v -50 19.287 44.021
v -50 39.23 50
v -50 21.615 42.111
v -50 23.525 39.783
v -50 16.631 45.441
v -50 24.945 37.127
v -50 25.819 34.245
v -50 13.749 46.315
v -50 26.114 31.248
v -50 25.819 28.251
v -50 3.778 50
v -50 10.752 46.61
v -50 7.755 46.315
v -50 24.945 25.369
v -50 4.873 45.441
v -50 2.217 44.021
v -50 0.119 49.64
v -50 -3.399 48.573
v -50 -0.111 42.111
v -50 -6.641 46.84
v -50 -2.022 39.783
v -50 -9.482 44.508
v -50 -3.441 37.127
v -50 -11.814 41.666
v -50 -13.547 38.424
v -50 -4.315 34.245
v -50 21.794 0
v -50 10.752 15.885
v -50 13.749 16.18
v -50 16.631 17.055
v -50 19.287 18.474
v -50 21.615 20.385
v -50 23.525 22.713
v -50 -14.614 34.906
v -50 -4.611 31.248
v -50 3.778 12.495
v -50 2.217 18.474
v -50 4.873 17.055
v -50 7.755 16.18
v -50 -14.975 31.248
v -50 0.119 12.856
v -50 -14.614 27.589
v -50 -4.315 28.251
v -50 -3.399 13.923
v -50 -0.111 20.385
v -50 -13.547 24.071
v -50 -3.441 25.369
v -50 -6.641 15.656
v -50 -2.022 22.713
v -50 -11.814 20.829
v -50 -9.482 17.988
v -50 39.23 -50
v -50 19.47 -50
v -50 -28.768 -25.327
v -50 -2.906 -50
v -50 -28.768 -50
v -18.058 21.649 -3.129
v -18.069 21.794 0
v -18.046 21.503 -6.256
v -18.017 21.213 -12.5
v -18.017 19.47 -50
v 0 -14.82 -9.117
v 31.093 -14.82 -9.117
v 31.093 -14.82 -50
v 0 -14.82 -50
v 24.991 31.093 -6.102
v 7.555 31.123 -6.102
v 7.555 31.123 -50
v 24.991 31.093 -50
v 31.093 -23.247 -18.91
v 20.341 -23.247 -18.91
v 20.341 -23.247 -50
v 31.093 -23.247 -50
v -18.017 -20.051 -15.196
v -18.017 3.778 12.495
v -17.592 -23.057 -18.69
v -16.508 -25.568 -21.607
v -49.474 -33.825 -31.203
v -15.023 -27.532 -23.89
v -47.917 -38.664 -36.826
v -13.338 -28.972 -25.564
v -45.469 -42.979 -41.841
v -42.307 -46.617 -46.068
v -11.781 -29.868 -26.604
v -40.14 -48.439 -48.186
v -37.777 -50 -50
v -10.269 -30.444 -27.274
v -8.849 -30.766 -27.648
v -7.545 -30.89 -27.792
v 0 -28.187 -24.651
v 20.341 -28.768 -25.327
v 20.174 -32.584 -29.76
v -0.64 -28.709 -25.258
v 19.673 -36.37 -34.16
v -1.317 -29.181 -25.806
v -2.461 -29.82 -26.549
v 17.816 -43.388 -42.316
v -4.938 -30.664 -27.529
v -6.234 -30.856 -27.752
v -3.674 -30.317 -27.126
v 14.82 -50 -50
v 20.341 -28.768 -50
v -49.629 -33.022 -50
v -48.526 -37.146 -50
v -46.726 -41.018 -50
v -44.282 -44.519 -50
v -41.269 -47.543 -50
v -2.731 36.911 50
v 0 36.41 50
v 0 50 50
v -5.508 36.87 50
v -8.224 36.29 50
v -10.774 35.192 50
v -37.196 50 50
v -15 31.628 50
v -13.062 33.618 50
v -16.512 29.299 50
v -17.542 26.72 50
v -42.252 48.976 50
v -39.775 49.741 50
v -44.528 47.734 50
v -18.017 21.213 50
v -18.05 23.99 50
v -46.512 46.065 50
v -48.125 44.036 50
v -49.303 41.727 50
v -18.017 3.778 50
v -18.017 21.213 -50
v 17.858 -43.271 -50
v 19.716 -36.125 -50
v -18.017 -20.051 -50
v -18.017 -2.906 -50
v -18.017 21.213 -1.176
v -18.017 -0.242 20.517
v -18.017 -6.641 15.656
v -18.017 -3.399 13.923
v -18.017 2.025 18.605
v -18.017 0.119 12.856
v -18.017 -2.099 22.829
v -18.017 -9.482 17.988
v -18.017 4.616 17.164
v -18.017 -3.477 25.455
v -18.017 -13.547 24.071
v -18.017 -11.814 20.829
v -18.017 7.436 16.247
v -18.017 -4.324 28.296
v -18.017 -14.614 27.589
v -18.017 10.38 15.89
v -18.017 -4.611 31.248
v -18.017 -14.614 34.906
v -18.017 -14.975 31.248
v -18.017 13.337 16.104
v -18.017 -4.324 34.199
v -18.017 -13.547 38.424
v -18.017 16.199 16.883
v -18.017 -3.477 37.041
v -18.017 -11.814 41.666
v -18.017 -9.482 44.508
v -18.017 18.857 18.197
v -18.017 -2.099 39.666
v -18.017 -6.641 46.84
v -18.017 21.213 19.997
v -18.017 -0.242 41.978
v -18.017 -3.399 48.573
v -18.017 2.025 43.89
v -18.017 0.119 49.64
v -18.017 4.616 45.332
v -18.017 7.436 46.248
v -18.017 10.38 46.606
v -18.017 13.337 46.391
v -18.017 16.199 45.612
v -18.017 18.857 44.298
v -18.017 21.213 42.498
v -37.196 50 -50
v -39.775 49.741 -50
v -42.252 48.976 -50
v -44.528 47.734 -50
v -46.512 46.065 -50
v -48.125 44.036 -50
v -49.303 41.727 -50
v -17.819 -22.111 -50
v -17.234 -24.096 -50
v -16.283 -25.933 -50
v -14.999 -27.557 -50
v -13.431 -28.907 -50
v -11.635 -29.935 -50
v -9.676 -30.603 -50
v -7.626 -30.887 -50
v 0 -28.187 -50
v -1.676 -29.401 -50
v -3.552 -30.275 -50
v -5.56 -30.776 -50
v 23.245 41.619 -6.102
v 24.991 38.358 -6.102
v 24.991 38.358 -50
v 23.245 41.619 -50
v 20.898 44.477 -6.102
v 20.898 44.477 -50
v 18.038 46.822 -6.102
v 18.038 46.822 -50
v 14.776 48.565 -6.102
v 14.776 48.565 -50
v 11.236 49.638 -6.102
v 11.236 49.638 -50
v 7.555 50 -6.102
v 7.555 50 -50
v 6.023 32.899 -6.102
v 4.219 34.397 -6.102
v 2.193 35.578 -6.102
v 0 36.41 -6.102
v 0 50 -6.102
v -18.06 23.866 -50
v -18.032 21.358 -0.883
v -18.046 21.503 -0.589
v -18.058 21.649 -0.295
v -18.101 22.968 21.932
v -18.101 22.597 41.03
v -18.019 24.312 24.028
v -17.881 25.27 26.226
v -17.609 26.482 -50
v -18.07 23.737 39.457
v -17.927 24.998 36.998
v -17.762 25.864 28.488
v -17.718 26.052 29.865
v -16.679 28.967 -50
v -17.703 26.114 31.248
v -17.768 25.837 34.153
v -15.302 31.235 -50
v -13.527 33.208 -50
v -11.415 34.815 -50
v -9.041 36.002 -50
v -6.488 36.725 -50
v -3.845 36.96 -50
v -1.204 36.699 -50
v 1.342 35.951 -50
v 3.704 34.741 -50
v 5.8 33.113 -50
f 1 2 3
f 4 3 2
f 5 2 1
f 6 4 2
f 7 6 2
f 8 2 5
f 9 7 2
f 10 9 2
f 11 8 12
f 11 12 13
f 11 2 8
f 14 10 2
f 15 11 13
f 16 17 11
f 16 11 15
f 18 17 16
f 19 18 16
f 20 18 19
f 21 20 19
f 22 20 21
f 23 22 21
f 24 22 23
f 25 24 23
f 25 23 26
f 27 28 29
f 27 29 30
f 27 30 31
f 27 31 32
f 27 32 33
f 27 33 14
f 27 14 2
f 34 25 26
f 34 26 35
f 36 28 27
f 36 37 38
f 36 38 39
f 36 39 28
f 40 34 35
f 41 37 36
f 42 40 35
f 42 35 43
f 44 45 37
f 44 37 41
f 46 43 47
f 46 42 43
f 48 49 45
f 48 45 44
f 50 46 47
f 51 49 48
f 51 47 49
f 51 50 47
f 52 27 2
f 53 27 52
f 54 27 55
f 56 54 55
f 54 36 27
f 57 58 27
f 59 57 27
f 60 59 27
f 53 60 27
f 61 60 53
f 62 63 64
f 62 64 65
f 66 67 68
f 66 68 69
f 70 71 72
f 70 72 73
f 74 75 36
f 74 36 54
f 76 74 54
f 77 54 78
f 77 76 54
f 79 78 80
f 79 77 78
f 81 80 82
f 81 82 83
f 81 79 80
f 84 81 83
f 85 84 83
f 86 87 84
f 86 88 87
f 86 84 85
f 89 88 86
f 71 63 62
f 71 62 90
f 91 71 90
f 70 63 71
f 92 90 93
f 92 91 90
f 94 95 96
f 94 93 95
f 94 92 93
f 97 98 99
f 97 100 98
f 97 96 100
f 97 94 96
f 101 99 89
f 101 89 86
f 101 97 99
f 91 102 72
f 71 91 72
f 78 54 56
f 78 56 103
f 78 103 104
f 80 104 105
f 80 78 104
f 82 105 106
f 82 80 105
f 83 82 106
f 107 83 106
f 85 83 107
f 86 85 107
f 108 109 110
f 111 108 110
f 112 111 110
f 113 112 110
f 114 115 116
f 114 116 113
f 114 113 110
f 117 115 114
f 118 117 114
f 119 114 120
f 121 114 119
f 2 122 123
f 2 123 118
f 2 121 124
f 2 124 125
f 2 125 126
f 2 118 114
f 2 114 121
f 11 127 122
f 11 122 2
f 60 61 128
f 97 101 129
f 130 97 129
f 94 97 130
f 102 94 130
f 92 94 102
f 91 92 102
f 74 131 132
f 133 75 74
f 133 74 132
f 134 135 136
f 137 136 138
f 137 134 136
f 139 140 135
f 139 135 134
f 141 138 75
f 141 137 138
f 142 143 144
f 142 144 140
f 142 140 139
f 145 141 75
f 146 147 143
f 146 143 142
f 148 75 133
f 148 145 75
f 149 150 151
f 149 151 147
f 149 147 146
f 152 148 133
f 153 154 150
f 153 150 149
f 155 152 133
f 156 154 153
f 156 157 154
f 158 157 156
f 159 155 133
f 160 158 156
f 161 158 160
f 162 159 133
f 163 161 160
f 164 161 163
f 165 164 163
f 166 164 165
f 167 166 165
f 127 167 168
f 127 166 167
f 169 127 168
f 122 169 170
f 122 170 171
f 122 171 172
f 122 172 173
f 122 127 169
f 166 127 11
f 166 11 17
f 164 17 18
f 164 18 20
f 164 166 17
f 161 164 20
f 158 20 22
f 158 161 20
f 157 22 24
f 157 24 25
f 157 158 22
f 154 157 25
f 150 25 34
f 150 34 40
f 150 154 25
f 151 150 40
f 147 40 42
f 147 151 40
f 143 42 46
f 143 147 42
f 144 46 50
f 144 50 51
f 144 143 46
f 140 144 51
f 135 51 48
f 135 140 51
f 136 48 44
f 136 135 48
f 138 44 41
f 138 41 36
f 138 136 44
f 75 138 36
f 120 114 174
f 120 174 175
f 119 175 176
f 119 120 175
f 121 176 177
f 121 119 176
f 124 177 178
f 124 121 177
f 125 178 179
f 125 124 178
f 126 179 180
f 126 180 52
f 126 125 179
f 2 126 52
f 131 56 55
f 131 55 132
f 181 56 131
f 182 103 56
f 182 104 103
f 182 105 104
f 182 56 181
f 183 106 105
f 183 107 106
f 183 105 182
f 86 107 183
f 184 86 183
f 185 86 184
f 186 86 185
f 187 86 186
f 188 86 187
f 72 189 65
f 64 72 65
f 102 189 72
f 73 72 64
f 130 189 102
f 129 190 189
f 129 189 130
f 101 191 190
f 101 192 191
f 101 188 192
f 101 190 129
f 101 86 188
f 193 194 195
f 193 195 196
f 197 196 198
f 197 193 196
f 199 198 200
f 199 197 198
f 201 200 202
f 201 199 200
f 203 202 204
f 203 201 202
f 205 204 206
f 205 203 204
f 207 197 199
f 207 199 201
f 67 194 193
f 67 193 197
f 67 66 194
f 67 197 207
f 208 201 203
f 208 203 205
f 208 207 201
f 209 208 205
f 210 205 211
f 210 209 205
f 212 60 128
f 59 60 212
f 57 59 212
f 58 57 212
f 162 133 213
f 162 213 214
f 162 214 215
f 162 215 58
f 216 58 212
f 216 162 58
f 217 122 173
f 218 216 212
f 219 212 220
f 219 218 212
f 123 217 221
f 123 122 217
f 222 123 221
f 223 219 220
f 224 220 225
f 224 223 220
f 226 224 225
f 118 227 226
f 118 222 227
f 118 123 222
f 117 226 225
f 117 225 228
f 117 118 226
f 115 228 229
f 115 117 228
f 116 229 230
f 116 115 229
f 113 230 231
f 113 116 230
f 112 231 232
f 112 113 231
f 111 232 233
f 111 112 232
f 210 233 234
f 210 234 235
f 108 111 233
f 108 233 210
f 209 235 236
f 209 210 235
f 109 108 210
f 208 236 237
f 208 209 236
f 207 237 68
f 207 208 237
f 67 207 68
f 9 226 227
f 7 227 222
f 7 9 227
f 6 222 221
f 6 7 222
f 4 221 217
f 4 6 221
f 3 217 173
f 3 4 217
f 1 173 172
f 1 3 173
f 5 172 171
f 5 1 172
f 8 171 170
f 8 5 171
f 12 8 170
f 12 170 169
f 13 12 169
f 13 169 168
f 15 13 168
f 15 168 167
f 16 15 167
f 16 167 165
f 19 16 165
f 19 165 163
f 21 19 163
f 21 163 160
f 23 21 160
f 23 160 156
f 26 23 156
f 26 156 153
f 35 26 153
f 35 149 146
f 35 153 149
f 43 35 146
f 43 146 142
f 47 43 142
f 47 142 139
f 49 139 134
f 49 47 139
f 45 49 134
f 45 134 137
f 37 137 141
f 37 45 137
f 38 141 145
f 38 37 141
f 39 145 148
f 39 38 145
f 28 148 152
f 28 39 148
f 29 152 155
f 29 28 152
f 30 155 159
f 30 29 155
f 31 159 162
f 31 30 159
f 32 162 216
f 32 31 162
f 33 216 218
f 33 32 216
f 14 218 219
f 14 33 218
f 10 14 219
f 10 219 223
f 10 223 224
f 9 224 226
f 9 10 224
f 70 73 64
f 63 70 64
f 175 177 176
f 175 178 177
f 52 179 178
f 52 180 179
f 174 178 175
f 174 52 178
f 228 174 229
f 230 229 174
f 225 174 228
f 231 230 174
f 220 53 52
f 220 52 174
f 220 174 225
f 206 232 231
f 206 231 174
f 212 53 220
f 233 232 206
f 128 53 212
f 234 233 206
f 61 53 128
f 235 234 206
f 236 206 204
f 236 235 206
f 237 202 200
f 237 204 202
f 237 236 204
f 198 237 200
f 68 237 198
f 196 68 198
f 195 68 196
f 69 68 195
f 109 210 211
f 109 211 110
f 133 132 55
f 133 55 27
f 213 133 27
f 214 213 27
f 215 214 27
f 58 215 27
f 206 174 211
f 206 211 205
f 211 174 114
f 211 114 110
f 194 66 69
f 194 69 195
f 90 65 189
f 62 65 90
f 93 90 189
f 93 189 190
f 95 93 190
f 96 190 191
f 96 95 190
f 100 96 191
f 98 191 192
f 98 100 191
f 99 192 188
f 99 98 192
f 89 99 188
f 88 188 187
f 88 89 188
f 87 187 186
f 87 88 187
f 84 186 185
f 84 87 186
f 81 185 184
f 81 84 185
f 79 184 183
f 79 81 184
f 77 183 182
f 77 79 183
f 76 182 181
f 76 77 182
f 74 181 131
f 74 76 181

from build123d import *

# Parameters (mm, degrees)
F3_DEPTH = 50
F1_R     = 15.3624630906
F4_DEPTH = 50
F5_DEPTH = 50


with BuildPart() as f3:
    # F2 (on Front) → F3 (new body, symmetric)
    with BuildSketch(Plane.XZ):
        Polygon((0, 50), (-50, 50), (-50, -50), (50, -50), (50, -6.1023989692), (0, -6.1023989692), align=None)
    extrude(amount=F3_DEPTH, both=True)

    # F1 (on Right) → F4 (intersect, symmetric)
    with BuildSketch(Plane.YZ):
        with BuildLine():
            Line((-28.1872693449, -50), (-22.0848694444, -50))
            Line((-22.0848694444, -50), (-8.4271216765, -50))
            Line((-8.4271216765, -50), (-2.9059045482, -50))
            Line((-2.9059045482, -50), (21.7942818999, 0))
            Line((21.7942818999, 0), (19.46955733, -50))
            Line((19.46955733, -50), (50, -50))
            Line((50, -50), (50, 50))
            Line((50, 50), (3.777674865, 50))
            ThreePointArc((3.777674865, 50), (-14.9746309966, 31.2476941384), (3.777674865, 12.4953882769))
            Line((3.777674865, 12.4953882769), (-50, -50))
            Line((-50, -50), (-28.1872693449, -50))
        make_face()
        with Locations((10.7518453151, 31.2476941384)):
            Circle(F1_R, mode=Mode.SUBTRACT)
    extrude(amount=F4_DEPTH, both=True, mode=Mode.INTERSECT)

    # F0 (on Top) → F5 (intersect, symmetric)
    with BuildSketch(Plane.XY):
        with BuildLine():
            Line((7.5553534552, 50), (-37.1955744922, 50))
            ThreePointArc((-37.1955744922, 50), (-45.5614657619, 46.9494015958), (-50, 39.2297059298))
            Line((-50, 39.2297059298), (-50, -28.7684518844))
            ThreePointArc((-50, -28.7684518844), (-46.7258687965, -41.0178028378), (-37.7767533064, -50))
            Line((-37.7767533064, -50), (14.8201081902, -50))
            ThreePointArc((14.8201081902, -50), (18.93844543, -39.7373000198), (20.3413292766, -28.7684518844))
            Line((20.3413292766, -28.7684518844), (20.3413292766, -23.2472326607))
            Line((20.3413292766, -23.2472326607), (31.0931764543, -23.2472326607))
            Line((31.0931764543, -23.2472326607), (31.0931764543, -14.8201109841))
            Line((31.0931764543, -14.8201109841), (0, -14.8201109841))
            Line((0, -14.8201109841), (0, -28.1872712076))
            ThreePointArc((0, -28.1872712076), (-11.6349197117, -29.9350844405), (-18.0166047066, -20.0507380068))
            Line((-18.0166047066, -20.0507380068), (-18.0166047066, 21.2131012231))
            ThreePointArc((-18.0166047066, 21.2131012231), (-9.0414378215, 36.0015865466), (7.5553534552, 31.1231197696))
            Line((7.5553534552, 31.1231197696), (24.9907784164, 31.0931745917))
            Line((24.9907784164, 31.0931745917), (24.9907784164, 38.3579358459))
            ThreePointArc((24.9907784164, 38.3579358459), (18.0378591355, 46.8219630995), (7.5553534552, 50))
        make_face()
    extrude(amount=F5_DEPTH, both=True, mode=Mode.INTERSECT)


solid = f3.part
